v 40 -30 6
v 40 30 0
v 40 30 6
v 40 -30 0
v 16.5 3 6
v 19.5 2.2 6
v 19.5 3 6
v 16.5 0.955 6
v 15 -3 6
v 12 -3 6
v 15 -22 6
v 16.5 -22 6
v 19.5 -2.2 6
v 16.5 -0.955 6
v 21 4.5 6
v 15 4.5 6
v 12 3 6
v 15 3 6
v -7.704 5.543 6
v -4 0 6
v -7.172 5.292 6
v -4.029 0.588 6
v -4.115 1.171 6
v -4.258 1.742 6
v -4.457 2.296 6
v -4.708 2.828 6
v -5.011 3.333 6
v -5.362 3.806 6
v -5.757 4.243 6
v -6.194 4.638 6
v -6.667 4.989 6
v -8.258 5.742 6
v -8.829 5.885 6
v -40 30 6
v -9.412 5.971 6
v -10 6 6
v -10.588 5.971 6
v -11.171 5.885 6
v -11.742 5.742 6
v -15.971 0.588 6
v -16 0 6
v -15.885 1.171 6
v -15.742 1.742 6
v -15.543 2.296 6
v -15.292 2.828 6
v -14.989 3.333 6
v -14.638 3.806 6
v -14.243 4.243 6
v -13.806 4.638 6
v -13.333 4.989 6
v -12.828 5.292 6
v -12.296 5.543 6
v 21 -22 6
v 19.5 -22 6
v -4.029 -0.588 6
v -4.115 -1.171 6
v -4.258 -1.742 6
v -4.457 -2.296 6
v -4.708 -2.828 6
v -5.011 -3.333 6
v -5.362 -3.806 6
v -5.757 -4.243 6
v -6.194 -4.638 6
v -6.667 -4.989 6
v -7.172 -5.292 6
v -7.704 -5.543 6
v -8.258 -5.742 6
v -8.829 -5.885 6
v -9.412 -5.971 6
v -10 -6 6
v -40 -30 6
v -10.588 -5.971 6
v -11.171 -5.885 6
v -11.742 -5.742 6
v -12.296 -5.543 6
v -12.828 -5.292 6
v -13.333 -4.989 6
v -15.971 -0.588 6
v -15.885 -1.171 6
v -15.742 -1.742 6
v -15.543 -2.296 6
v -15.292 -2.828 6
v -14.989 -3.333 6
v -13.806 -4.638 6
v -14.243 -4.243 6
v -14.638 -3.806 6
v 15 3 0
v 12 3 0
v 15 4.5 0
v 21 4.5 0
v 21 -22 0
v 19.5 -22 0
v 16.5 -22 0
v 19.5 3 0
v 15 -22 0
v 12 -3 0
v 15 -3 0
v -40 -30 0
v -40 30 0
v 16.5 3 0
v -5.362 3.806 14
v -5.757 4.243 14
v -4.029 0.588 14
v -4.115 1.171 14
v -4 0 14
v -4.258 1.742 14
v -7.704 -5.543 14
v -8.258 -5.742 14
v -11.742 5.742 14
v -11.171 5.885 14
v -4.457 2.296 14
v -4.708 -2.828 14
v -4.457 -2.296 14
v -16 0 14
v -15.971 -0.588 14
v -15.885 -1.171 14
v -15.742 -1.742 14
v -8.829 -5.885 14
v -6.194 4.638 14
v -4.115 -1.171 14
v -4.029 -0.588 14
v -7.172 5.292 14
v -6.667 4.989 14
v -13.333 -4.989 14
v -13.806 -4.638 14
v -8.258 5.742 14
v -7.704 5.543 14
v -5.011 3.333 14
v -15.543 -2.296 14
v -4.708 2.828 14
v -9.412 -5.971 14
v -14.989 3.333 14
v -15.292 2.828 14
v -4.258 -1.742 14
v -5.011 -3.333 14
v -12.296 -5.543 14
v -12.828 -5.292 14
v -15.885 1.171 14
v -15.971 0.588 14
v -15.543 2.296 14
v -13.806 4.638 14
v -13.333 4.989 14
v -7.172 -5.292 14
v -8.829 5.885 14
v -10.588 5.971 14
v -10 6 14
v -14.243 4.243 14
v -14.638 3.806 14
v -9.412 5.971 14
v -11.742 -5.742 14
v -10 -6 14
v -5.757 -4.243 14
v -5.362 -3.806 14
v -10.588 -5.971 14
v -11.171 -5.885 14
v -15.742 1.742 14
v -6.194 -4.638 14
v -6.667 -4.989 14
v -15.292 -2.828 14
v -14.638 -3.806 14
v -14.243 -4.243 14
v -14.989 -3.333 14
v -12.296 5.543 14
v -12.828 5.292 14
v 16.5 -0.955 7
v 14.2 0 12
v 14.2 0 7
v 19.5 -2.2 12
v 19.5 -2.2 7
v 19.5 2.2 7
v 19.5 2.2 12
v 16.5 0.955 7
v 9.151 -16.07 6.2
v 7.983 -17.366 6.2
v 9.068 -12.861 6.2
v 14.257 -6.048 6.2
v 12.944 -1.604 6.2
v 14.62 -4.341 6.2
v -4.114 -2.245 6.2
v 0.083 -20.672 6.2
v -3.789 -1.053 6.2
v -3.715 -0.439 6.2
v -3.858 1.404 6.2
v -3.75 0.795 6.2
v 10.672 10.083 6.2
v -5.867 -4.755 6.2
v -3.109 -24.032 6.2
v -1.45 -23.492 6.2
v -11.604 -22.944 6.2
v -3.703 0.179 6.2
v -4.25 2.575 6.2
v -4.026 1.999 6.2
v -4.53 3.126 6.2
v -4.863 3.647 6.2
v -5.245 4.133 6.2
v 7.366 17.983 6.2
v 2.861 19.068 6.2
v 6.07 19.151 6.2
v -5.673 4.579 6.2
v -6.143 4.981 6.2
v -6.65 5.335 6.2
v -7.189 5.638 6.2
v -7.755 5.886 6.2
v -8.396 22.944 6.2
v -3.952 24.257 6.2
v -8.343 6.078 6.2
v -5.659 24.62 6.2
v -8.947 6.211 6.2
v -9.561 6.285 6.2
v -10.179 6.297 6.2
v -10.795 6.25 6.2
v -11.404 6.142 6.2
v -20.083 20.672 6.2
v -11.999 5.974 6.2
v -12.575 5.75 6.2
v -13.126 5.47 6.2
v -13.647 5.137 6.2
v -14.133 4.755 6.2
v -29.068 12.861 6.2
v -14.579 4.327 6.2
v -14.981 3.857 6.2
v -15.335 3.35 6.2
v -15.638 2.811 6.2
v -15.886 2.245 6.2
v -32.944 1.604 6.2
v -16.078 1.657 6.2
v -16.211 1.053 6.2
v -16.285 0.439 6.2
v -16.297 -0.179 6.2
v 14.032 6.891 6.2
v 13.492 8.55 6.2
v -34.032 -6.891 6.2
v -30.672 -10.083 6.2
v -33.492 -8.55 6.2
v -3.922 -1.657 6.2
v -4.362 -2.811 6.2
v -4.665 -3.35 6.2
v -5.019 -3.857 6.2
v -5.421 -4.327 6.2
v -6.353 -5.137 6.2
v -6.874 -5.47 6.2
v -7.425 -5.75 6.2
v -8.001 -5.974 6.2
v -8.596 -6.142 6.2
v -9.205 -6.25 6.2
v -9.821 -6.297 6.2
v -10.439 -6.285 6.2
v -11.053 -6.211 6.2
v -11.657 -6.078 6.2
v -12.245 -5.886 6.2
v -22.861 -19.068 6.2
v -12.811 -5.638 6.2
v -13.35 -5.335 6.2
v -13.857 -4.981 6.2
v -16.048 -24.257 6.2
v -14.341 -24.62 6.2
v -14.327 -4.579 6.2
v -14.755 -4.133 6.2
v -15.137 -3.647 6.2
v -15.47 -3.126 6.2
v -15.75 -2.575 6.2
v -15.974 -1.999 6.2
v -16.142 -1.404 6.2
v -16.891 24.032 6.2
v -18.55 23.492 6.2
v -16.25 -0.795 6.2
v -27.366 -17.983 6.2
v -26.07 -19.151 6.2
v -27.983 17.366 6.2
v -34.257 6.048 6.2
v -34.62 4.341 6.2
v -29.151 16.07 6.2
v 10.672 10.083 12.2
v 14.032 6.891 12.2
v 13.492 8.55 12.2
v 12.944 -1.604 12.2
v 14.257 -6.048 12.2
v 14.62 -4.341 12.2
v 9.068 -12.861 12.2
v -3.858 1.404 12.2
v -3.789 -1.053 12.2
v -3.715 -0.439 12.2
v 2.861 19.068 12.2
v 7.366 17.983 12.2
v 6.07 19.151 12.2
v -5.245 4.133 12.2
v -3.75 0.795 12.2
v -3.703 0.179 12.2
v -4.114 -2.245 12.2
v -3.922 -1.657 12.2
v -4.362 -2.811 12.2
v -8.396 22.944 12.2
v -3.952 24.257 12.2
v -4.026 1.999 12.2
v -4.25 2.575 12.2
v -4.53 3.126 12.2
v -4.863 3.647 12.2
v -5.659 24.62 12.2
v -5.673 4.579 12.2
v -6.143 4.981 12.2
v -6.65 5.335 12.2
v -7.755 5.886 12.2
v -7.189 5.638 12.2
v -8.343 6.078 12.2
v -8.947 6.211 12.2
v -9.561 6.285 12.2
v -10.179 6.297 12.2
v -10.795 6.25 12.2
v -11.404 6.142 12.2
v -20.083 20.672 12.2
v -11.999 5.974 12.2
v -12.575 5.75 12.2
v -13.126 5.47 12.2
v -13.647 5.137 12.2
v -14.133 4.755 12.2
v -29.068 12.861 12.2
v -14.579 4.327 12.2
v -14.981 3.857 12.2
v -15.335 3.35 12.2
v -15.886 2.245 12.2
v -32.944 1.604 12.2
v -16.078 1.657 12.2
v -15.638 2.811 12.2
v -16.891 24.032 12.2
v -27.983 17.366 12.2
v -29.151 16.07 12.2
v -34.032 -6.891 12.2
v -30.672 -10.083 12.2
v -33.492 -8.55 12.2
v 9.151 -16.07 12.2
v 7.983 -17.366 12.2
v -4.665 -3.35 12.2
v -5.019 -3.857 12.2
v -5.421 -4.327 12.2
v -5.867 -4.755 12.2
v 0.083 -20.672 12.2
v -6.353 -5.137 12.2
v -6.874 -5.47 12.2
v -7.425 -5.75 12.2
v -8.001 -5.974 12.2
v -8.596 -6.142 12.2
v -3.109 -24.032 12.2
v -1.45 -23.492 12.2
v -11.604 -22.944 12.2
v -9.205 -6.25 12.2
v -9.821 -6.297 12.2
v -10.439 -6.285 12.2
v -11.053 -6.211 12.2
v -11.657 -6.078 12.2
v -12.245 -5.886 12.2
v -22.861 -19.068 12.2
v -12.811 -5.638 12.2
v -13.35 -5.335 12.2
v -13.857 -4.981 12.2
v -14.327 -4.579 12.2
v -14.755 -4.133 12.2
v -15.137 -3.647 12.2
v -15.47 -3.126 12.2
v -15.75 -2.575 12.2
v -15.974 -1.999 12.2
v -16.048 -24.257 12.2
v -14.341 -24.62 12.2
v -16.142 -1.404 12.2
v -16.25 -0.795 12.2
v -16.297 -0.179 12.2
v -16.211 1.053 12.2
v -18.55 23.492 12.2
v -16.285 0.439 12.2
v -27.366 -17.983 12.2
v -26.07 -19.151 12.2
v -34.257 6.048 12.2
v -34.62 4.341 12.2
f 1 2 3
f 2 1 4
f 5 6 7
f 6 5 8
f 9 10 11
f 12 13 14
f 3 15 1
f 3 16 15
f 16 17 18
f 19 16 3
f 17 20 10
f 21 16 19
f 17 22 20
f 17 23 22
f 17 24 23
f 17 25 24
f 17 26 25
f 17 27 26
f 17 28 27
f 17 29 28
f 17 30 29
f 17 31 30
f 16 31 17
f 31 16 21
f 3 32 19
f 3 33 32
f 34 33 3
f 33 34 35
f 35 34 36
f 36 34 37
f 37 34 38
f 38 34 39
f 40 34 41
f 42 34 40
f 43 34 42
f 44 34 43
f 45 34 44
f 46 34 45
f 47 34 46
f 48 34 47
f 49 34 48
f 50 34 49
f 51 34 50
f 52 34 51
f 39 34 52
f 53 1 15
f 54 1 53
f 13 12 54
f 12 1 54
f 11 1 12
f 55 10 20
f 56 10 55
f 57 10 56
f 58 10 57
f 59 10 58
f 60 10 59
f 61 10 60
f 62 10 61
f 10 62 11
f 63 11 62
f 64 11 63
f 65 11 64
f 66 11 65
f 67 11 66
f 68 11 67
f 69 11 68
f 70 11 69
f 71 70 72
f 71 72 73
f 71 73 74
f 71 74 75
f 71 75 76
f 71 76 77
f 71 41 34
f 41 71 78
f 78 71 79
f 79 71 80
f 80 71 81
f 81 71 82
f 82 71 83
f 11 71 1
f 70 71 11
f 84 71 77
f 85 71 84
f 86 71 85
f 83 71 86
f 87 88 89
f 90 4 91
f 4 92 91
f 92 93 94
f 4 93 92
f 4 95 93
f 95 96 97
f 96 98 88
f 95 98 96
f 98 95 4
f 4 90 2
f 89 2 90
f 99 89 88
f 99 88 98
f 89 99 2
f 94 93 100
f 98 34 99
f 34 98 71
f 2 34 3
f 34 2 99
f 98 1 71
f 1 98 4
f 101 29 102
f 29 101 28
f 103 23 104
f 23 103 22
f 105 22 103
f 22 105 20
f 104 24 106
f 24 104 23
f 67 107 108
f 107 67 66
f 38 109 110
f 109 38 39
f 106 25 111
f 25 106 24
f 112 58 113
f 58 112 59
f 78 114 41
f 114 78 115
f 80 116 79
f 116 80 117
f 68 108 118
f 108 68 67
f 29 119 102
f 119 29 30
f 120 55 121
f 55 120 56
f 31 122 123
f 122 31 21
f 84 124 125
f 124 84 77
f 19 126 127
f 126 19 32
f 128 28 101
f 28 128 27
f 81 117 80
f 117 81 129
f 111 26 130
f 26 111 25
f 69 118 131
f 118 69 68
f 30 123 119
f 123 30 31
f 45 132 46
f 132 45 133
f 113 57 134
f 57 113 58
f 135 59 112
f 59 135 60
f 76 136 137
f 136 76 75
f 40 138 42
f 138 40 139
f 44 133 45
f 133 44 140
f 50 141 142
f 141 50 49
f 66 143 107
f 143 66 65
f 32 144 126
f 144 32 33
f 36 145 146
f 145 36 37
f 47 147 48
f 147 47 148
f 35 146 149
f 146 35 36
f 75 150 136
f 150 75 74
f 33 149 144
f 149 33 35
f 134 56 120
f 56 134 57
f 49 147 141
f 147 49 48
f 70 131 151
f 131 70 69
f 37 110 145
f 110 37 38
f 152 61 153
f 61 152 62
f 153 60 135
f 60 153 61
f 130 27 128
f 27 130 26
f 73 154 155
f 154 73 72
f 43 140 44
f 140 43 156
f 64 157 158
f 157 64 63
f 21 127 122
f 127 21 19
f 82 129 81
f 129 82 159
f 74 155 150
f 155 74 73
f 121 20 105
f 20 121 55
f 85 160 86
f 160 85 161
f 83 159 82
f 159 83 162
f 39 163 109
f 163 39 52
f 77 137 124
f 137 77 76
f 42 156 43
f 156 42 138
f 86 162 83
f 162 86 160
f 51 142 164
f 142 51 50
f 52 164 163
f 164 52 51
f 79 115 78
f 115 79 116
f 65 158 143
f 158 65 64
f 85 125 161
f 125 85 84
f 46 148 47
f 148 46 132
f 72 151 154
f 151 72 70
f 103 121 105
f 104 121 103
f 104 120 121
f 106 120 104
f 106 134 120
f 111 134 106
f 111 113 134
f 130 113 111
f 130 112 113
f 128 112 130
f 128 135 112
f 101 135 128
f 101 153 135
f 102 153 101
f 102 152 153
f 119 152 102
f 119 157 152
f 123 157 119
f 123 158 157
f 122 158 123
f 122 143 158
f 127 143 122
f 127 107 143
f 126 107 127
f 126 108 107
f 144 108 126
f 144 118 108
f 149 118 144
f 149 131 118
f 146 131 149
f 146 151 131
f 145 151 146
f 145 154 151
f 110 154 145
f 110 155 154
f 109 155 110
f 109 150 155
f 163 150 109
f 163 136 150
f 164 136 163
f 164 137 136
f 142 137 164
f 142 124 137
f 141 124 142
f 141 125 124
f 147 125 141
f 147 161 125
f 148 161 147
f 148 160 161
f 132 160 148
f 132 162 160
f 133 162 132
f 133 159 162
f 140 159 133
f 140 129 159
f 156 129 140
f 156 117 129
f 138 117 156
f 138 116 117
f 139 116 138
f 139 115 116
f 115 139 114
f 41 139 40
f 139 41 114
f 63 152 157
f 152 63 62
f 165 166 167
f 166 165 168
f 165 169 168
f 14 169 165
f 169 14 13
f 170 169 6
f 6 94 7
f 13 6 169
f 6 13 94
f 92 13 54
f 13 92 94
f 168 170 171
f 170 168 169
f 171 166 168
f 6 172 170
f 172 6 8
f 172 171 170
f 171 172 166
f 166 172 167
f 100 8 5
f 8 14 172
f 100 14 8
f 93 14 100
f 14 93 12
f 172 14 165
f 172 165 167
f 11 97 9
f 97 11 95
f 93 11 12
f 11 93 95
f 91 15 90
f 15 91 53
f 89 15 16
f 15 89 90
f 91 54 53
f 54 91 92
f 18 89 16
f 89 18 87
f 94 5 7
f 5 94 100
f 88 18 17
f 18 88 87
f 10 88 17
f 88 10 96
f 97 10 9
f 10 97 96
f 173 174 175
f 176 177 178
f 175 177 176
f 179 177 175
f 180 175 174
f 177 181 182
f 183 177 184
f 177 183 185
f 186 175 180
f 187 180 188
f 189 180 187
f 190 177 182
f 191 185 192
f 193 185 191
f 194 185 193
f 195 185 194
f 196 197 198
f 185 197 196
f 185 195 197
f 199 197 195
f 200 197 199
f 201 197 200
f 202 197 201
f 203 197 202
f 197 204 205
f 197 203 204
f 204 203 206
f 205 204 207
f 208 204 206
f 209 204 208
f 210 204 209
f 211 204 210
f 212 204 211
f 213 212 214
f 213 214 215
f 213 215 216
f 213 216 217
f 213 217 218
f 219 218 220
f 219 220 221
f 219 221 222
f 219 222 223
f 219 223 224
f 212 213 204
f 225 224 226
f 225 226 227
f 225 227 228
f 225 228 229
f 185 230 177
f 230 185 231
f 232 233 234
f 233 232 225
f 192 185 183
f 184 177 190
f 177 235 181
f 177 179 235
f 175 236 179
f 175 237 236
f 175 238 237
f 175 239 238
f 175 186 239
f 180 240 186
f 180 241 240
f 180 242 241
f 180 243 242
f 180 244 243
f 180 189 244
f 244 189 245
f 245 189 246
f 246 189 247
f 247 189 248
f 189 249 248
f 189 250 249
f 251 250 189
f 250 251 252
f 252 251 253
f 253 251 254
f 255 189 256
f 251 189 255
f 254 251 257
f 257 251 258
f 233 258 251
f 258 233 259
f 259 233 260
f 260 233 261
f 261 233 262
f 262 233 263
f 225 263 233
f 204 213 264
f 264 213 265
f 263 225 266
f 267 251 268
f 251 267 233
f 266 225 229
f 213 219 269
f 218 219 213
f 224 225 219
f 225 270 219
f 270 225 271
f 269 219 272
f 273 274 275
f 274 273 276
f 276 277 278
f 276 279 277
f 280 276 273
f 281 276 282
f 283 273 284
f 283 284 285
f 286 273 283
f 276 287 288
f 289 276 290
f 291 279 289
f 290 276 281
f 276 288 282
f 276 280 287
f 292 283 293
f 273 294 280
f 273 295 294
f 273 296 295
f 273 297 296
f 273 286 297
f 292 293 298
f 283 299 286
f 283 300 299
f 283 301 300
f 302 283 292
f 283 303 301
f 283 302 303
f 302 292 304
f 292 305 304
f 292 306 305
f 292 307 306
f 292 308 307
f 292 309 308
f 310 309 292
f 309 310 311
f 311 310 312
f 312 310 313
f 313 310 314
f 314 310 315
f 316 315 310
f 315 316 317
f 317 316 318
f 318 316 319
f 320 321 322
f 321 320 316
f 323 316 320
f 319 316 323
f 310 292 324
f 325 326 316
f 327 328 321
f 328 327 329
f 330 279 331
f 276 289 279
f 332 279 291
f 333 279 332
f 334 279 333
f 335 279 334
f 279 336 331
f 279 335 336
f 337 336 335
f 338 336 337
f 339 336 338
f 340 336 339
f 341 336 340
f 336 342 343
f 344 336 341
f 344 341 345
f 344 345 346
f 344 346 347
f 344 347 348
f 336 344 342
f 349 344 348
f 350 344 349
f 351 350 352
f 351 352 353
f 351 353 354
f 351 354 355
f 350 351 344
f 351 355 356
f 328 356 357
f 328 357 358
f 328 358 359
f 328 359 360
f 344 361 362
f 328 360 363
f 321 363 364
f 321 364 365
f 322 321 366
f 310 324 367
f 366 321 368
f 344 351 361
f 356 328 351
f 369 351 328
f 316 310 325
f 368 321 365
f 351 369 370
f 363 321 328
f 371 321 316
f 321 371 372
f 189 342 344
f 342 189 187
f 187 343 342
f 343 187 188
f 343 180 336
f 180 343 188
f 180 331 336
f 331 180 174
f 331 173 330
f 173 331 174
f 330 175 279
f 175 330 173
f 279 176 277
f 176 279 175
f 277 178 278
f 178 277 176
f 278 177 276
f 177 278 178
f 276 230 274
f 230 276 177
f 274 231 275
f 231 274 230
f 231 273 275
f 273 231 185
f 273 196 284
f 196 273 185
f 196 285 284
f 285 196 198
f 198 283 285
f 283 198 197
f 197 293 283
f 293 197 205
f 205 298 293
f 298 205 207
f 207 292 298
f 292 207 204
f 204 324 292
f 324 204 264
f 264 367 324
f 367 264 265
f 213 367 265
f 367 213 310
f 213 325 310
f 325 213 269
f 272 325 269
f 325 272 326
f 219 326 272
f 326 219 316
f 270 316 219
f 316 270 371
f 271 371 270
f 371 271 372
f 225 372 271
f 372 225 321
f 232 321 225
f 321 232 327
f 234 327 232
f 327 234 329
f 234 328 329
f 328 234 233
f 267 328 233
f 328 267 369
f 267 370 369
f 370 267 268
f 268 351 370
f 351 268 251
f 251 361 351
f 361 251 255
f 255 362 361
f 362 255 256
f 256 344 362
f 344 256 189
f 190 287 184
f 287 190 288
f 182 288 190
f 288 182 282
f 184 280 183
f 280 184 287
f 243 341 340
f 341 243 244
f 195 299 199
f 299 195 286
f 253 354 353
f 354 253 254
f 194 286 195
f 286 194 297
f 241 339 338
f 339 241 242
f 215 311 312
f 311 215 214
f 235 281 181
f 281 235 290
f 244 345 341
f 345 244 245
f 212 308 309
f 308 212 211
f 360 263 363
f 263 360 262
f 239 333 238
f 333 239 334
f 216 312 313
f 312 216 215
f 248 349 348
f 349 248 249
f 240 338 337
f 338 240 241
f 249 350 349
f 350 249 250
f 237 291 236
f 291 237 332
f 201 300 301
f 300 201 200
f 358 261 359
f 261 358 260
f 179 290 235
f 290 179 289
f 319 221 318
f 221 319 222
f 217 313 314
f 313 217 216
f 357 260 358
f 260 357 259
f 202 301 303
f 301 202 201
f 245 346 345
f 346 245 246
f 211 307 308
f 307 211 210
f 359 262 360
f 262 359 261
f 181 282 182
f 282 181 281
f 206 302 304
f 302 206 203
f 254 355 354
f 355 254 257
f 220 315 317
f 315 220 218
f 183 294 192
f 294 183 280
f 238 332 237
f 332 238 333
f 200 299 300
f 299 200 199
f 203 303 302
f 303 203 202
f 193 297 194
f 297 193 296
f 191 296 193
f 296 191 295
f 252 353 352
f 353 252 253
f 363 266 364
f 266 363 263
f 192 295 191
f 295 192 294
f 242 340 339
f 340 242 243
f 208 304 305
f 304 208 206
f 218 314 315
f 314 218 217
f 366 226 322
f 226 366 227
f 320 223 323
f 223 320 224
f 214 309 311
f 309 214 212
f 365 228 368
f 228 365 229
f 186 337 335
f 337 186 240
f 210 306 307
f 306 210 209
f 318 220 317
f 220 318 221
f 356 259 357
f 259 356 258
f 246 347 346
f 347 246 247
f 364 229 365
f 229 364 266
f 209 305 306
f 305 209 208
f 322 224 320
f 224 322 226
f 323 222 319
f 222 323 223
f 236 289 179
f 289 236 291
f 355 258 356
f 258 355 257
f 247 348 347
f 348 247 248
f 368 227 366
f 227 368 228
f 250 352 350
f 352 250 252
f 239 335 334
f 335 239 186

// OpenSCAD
/* Ratchet wheel with spring pawl - desk demo, PLA, 0.4mm nozzle, no supports.
   Wheel (~50mm, 12 teeth) turns on a post; pawl on a flexible arm cut from the
   base plate bends aside as teeth pass (free way) and blocks reverse.
   Free way: clockwise seen from above (+z), i.e. negative rotation about +z. */
part = "assembly"; // [wheel:Wheel, base:Base, assembly:Assembly]

cadverify_only = "";
module instance(name, part, unit = 1) {
    echo(cadverify_instance = [name, part, unit]);
    if (cadverify_only == "" || cadverify_only == name) children();
}

// ---------- parameters (mm) ----------
Rtip = 25;          // wheel outer radius (50 mm across)
Rroot = 23;         // wheel root radius (tooth height 2 mm)
wheel_t = 6;        // wheel thickness
hole_D = 12.6;      // wheel centre hole diameter
post_D = 12;        // base post diameter (0.6 mm play)
post_h = 8;         // post height above base top
base_t = 6;         // base plate thickness
base_x = 80;
base_y = 60;
wheel_cx = -10;     // wheel centre in base/assembly XY
wheel_cy = 0;
wheel_gap = 0.2;    // wheel bottom above base top
wheel_lift_z = base_t + wheel_gap;   // 6.2 wheel bottom in assembly
post_top_z = base_t + post_h;        // 14
pawl_tip_x = 14.2;  // pawl tip (0.8 mm inside tip circle, 1.2 mm off root)
beam_x0 = 16.5; beam_x1 = 19.5;      // flexible arm: 3 mm wide ...
beam_y0 = -22; beam_y1 = 3;          // ... 25 mm long, fixed at south, free at north
slot_w = 1.5;       // slot width (clears a 0.4 mm nozzle)
pawl_h = 6;         // pawl height above plate (meets the wheel band 6.2..12.2)
rest_angle = -4.0;  // wheel rest rotation: gullet centred on pawl tip

// tooth k: root at 30k, shallow rise to tip at 30k+20, tip land to +24, steep drop to root at 30k+30
function wheel_pts() = [
    for(k=[0:11]) for(j=[0:2])
        j==0 ? [Rroot*cos(k*30), Rroot*sin(k*30)]
      : j==1 ? [Rtip*cos(k*30+20), Rtip*sin(k*30+20)]
             : [Rtip*cos(k*30+24), Rtip*sin(k*30+24)]
];

module wheel() {
    difference() {
        linear_extrude(height=wheel_t, convexity=4)
            polygon(points=wheel_pts());
        translate([0,0,-1]) cylinder(d=hole_D, h=wheel_t+2, $fn=64);
    }
}

module base() {
    difference() {
        union() {
            // plate
            translate([-base_x/2, -base_y/2, 0]) cube([base_x, base_y, base_t]);
            // post the wheel turns on
            translate([wheel_cx, wheel_cy, base_t]) cylinder(d=post_D, h=post_h, $fn=64);
            // pawl wedge: tip near the wheel, root fused onto the free end of the arm
            translate([0,0,base_t]) linear_extrude(height=pawl_h, convexity=2)
                polygon(points=[[pawl_tip_x, 0],[beam_x1, 2.2],[beam_x1, -2.2]]);
        }
        // U-slot freeing the arm (one connected through opening) + window under pawl tip
        translate([beam_x0-slot_w, beam_y0, -1]) cube([slot_w, (beam_y1-0)-beam_y0+beam_y0+19, base_t+2]); // west narrow x15..16.5 y-22..-3
        translate([beam_x1, beam_y0, -1]) cube([slot_w, 26.5, base_t+2]);         // east x19.5..21 y-22..4.5
        translate([beam_x0-slot_w, beam_y1, -1]) cube([6, slot_w, base_t+2]);     // north x15..21 y3..4.5
        translate([12, -3, -1]) cube([4.5, 6, base_t+2]);                          // window x12..16.5 y-3..3
    }
}

module assembly() {
    instance("base_inst", "base", 1) base();
    instance("wheel_inst", "wheel", 1)
        translate([wheel_cx, wheel_cy, wheel_lift_z]) rotate([0,0,rest_angle]) wheel();
}

// ---------- specs (computed from parameters) ----------
wheel_spec = [
    ["bounds", [[-Rtip, -Rtip, 0], [Rtip, Rtip, wheel_t]]],
    ["bodies", 1],
    ["through_holes", 1],
    ["support_faces", [["bed", "-z", 800]]],
    ["overhangs_allowed", []],
    ["copies", 1],
    ["details", [
        ["axle_hole", "hole", [0, 0, wheel_t+4], [0, 0, -1], [[0, hole_D], [wheel_t, hole_D]]],
        ["rim_thick", "thickness", [15, 0, wheel_t+4], [0, 0, -1], wheel_t],
        ["tooth0", "material", [[22.9, 8.0, 0], [24.1, 9.1, wheel_t]], 0.2],
        ["tooth4", "material", [[-19.8, 15.5, 0], [-18.5, 16.6, wheel_t]], 0.2],
        ["tooth8", "material", [[-5.0, -25.2, 0], [-3.7, -24.0, wheel_t]], 0.2]
    ]]
];

base_spec = [
    ["bounds", [[-base_x/2, -base_y/2, 0], [base_x/2, base_y/2, post_top_z]]],
    ["bodies", 1],
    ["through_holes", 1],
    ["support_faces", [["bed", "-z", 2000]]],
    ["overhangs_allowed", [["pawl bridges slot", [[14, -1.5, 5.9], [17, 1.5, 6.1]]]]],
    ["copies", 1],
    ["details", [
        ["plate_thick", "thickness", [0, -28, base_t+4], [0, 0, -1], base_t],
        ["post_dia", "thickness", [wheel_cx-10, wheel_cy, 13], [1, 0, 0], post_D],
        ["post_core", "material", [[wheel_cx-2, -2, 8], [wheel_cx+2, 2, 13]], 0.8],
        ["arm_block", "material", [[17, -20, 0], [19, -12, base_t]], 0.8],
        ["slot_gap", "void", [[beam_x0-slot_w, -20, 0], [beam_x0, -10, base_t]], 0.8],
        ["window_void", "void", [[12.5, -2.5, 0], [16, 2.5, base_t]], 0.8],
        ["pawl_tip", "material", [[14.5, -0.4, 8], [15.5, 0.4, 11]], 0.5],
        ["pawl_tip_height", "thickness", [14.5, 0, base_t+pawl_h+3], [0, 0, -1], pawl_h]
    ]]
];

assembly_spec = [
    ["bounds", [[-base_x/2, -base_y/2, 0], [base_x/2, base_y/2, post_top_z]]],
    ["support_faces", [["desk", "-z", 2000]]],
    ["allowed_interferences", []],
    ["motions", [
        ["spin_free", ["wheel_inst"], "rotate", [wheel_cx, wheel_cy, wheel_lift_z], [0, 0, 1], [0, -360],
            ["flex", [["wheel_inst", "base_inst", 0.9, "pawl clicks over teeth"]]]]
    ]],
    ["assembly_order", [
        [["base_inst"], [0, 0, 0]],
        [["wheel_inst"], [0, 0, -1]]
    ]]
];

if (part == "wheel") {
    echo(cadverify_spec = wheel_spec);
    wheel();
} else if (part == "base") {
    echo(cadverify_spec = base_spec);
    base();
} else {
    echo(cadverify_spec = assembly_spec);
    assembly();
}
